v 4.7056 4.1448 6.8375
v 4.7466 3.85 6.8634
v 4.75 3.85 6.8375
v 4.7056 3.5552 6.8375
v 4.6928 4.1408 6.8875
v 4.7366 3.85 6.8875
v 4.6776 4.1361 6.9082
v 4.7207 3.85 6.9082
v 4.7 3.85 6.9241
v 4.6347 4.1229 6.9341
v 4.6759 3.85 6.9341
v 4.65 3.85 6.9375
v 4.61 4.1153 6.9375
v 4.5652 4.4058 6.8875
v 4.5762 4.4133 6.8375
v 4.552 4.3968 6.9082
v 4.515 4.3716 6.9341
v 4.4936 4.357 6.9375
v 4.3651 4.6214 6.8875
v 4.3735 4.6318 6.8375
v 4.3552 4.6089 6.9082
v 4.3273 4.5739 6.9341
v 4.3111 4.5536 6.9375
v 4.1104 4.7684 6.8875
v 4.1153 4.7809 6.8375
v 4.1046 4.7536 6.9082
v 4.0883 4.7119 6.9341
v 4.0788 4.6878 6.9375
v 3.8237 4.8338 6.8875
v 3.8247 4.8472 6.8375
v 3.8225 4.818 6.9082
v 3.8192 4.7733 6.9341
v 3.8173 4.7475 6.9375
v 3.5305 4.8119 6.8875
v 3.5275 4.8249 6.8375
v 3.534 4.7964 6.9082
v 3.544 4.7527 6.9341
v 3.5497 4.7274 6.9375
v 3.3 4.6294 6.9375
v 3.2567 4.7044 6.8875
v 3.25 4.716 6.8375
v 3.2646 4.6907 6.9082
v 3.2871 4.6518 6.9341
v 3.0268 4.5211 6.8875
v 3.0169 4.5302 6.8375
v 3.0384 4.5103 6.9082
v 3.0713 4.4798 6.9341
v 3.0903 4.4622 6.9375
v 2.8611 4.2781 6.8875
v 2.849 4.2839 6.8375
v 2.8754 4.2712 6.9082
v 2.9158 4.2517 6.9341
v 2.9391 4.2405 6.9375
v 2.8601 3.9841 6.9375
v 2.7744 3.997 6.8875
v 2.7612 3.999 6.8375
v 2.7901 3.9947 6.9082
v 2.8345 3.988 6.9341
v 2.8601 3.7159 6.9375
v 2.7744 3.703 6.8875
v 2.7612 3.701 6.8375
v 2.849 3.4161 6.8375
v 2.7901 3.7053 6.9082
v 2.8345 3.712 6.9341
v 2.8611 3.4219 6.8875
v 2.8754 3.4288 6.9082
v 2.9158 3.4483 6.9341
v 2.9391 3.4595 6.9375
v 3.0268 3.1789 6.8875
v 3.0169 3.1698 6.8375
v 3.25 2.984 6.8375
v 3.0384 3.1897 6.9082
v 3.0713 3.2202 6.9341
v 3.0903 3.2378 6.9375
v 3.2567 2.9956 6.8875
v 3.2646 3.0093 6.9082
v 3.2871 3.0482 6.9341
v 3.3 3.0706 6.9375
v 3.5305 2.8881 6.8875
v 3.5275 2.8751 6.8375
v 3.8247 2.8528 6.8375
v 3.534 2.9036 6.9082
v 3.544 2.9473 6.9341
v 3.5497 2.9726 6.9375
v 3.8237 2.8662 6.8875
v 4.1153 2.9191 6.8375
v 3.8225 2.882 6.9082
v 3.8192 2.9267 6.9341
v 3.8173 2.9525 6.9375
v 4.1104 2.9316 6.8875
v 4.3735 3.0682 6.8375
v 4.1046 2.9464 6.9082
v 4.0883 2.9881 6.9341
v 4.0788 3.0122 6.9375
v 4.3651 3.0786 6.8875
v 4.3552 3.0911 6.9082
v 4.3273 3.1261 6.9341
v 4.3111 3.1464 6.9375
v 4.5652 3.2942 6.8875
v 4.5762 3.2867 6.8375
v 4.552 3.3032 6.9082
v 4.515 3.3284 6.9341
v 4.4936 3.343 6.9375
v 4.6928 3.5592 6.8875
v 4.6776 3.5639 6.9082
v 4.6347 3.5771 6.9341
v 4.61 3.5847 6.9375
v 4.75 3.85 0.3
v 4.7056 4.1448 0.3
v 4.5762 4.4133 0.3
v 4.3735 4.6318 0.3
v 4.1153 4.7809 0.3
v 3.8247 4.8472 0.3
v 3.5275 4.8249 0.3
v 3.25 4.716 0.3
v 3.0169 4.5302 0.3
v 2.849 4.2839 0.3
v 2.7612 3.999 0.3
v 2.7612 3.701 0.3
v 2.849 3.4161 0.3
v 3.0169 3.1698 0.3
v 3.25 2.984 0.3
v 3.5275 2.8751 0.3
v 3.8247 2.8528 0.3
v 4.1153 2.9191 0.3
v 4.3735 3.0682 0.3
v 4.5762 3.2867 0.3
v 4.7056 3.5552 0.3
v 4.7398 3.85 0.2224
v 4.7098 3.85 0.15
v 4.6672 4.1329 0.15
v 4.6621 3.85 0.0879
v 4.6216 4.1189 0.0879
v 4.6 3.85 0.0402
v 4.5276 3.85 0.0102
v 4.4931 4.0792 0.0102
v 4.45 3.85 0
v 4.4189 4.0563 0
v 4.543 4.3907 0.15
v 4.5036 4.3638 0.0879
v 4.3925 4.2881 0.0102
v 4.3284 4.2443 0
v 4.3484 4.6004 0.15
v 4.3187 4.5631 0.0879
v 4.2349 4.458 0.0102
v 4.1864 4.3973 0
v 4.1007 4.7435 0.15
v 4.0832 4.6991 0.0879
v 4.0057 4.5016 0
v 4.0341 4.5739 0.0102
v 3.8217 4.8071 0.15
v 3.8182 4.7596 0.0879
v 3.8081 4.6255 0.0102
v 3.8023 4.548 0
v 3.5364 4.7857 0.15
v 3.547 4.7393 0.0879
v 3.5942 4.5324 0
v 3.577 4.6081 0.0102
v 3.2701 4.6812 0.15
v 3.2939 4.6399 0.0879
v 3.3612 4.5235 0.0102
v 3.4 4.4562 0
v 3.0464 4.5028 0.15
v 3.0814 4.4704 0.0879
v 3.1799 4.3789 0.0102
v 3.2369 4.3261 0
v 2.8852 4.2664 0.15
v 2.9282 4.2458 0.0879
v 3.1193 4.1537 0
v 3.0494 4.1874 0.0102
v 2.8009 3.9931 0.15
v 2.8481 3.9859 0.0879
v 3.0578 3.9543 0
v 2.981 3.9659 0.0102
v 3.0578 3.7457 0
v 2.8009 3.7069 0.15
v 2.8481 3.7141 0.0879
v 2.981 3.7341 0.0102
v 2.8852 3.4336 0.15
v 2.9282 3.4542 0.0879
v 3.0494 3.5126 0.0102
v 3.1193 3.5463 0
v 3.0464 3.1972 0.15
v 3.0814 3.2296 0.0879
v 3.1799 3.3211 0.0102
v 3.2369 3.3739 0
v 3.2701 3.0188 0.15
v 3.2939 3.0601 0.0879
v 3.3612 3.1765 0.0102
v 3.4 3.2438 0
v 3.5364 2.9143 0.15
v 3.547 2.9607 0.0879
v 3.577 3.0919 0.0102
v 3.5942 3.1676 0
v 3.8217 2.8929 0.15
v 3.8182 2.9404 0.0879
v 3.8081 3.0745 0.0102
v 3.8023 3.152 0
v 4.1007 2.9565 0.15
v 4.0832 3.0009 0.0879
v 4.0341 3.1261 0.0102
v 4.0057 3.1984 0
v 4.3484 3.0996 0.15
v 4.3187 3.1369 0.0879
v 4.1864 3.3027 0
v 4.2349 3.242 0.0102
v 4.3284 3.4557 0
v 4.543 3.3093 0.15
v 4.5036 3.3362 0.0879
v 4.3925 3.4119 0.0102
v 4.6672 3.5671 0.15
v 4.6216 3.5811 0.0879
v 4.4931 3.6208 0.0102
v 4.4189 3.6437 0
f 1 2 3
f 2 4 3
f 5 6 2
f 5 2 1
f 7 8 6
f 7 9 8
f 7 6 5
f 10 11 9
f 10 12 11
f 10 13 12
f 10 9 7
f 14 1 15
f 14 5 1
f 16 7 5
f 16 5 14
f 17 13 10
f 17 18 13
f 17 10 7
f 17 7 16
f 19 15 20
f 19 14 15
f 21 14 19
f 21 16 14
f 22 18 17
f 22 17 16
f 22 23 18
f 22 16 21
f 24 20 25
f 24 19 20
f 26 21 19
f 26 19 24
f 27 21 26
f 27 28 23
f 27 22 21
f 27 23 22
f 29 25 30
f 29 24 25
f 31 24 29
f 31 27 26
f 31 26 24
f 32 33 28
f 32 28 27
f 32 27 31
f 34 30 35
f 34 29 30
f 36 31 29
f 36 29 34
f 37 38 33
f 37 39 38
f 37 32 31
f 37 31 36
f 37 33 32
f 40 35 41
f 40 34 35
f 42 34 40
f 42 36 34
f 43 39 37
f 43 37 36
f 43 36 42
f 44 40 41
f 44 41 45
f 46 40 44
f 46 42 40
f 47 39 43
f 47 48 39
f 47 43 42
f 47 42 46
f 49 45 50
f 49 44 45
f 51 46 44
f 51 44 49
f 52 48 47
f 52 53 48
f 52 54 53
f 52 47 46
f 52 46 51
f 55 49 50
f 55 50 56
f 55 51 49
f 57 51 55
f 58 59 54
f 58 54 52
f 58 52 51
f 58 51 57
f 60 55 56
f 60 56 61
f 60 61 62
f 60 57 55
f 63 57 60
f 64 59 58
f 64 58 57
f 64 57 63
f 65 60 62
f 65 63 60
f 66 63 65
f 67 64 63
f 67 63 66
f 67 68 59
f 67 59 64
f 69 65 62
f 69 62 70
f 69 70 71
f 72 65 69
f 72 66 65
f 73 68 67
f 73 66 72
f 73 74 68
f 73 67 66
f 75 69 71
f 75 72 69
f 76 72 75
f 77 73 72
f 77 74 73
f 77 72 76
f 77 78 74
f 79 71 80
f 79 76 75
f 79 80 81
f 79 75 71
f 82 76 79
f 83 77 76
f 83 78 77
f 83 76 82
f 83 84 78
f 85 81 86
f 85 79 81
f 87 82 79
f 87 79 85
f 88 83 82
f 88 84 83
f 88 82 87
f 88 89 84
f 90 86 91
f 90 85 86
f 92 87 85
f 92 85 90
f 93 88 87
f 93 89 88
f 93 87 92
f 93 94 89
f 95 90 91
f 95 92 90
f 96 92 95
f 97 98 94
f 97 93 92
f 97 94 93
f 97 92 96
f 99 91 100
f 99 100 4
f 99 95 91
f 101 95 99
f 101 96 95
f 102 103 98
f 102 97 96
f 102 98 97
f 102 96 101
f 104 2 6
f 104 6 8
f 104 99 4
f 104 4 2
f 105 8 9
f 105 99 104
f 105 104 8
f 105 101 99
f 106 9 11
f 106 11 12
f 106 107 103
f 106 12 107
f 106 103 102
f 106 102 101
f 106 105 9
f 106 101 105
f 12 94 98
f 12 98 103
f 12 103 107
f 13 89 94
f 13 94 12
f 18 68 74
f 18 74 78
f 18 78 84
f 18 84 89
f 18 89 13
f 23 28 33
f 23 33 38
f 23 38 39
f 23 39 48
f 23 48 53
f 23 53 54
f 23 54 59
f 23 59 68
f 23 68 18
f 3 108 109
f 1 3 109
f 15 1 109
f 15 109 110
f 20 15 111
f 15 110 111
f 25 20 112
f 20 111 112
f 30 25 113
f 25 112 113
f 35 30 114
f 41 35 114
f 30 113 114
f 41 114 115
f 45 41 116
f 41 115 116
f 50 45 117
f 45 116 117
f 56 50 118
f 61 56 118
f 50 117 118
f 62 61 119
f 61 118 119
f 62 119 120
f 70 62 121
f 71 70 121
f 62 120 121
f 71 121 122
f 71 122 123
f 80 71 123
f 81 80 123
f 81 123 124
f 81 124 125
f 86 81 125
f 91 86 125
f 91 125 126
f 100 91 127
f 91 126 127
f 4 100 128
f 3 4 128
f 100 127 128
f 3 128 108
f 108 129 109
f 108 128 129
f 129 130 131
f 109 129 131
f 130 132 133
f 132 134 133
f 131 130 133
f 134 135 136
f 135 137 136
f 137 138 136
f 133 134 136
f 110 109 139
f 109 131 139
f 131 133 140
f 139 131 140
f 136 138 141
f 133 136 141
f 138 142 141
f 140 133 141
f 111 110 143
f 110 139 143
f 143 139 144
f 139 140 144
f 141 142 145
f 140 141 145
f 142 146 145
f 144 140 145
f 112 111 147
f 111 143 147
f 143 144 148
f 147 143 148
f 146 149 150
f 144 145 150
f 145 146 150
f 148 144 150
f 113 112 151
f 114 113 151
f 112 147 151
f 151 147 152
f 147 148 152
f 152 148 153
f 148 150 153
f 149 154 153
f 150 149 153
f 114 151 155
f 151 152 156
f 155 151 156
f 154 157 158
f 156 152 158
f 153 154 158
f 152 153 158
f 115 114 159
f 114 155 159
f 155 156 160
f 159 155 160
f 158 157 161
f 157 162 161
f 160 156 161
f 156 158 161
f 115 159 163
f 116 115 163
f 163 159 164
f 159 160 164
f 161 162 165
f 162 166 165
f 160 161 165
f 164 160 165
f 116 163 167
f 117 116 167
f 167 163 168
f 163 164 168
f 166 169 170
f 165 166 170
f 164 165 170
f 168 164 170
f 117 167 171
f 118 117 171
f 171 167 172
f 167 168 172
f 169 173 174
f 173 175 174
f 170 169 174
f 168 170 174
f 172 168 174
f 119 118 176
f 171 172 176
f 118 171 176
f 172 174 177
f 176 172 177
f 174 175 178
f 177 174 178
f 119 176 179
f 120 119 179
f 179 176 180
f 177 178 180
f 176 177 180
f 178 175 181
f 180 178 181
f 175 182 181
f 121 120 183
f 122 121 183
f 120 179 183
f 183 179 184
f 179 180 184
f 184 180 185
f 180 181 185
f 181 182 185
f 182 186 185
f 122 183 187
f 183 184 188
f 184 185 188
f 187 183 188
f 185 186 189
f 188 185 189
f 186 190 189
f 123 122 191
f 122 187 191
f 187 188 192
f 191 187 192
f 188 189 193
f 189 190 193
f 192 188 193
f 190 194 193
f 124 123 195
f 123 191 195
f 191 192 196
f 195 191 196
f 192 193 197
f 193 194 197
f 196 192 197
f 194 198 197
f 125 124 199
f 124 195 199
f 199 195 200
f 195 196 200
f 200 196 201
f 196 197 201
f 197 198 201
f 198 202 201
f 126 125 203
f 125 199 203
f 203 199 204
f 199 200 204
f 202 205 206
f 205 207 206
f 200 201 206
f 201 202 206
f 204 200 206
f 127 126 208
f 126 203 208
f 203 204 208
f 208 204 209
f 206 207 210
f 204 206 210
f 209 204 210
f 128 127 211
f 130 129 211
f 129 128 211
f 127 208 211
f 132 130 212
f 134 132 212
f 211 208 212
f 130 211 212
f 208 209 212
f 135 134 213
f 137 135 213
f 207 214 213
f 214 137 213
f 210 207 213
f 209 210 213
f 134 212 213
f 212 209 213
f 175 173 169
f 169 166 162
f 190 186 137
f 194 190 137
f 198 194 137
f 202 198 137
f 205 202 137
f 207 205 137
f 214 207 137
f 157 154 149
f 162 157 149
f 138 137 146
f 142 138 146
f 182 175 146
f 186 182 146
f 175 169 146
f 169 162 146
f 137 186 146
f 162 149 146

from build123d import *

# Parameters (mm, degrees)
SKETCH007_R  = 1
PAD003_DEPTH = 6.9375
FILLET002_R  = 0.1
FILLET003_R  = 0.3


with BuildPart() as part:
    # Sketch007 → Pad003 (new body)
    with BuildSketch(Plane.XY):
        with Locations((3.75, 3.85)):
            Circle(SKETCH007_R)
    extrude(amount=PAD003_DEPTH)

    # Fillet002
    fillet002_edges = [part.edges().sort_by_distance(p)[0] for p in [
        (2.75, 3.85, 6.9375),
    ]]
    fillet(fillet002_edges, radius=FILLET002_R)

    # Fillet003
    fillet003_edges = [part.edges().sort_by_distance(p)[0] for p in [
        (2.75, 3.85, 0),
    ]]
    fillet(fillet003_edges, radius=FILLET003_R)


solid = part.part
